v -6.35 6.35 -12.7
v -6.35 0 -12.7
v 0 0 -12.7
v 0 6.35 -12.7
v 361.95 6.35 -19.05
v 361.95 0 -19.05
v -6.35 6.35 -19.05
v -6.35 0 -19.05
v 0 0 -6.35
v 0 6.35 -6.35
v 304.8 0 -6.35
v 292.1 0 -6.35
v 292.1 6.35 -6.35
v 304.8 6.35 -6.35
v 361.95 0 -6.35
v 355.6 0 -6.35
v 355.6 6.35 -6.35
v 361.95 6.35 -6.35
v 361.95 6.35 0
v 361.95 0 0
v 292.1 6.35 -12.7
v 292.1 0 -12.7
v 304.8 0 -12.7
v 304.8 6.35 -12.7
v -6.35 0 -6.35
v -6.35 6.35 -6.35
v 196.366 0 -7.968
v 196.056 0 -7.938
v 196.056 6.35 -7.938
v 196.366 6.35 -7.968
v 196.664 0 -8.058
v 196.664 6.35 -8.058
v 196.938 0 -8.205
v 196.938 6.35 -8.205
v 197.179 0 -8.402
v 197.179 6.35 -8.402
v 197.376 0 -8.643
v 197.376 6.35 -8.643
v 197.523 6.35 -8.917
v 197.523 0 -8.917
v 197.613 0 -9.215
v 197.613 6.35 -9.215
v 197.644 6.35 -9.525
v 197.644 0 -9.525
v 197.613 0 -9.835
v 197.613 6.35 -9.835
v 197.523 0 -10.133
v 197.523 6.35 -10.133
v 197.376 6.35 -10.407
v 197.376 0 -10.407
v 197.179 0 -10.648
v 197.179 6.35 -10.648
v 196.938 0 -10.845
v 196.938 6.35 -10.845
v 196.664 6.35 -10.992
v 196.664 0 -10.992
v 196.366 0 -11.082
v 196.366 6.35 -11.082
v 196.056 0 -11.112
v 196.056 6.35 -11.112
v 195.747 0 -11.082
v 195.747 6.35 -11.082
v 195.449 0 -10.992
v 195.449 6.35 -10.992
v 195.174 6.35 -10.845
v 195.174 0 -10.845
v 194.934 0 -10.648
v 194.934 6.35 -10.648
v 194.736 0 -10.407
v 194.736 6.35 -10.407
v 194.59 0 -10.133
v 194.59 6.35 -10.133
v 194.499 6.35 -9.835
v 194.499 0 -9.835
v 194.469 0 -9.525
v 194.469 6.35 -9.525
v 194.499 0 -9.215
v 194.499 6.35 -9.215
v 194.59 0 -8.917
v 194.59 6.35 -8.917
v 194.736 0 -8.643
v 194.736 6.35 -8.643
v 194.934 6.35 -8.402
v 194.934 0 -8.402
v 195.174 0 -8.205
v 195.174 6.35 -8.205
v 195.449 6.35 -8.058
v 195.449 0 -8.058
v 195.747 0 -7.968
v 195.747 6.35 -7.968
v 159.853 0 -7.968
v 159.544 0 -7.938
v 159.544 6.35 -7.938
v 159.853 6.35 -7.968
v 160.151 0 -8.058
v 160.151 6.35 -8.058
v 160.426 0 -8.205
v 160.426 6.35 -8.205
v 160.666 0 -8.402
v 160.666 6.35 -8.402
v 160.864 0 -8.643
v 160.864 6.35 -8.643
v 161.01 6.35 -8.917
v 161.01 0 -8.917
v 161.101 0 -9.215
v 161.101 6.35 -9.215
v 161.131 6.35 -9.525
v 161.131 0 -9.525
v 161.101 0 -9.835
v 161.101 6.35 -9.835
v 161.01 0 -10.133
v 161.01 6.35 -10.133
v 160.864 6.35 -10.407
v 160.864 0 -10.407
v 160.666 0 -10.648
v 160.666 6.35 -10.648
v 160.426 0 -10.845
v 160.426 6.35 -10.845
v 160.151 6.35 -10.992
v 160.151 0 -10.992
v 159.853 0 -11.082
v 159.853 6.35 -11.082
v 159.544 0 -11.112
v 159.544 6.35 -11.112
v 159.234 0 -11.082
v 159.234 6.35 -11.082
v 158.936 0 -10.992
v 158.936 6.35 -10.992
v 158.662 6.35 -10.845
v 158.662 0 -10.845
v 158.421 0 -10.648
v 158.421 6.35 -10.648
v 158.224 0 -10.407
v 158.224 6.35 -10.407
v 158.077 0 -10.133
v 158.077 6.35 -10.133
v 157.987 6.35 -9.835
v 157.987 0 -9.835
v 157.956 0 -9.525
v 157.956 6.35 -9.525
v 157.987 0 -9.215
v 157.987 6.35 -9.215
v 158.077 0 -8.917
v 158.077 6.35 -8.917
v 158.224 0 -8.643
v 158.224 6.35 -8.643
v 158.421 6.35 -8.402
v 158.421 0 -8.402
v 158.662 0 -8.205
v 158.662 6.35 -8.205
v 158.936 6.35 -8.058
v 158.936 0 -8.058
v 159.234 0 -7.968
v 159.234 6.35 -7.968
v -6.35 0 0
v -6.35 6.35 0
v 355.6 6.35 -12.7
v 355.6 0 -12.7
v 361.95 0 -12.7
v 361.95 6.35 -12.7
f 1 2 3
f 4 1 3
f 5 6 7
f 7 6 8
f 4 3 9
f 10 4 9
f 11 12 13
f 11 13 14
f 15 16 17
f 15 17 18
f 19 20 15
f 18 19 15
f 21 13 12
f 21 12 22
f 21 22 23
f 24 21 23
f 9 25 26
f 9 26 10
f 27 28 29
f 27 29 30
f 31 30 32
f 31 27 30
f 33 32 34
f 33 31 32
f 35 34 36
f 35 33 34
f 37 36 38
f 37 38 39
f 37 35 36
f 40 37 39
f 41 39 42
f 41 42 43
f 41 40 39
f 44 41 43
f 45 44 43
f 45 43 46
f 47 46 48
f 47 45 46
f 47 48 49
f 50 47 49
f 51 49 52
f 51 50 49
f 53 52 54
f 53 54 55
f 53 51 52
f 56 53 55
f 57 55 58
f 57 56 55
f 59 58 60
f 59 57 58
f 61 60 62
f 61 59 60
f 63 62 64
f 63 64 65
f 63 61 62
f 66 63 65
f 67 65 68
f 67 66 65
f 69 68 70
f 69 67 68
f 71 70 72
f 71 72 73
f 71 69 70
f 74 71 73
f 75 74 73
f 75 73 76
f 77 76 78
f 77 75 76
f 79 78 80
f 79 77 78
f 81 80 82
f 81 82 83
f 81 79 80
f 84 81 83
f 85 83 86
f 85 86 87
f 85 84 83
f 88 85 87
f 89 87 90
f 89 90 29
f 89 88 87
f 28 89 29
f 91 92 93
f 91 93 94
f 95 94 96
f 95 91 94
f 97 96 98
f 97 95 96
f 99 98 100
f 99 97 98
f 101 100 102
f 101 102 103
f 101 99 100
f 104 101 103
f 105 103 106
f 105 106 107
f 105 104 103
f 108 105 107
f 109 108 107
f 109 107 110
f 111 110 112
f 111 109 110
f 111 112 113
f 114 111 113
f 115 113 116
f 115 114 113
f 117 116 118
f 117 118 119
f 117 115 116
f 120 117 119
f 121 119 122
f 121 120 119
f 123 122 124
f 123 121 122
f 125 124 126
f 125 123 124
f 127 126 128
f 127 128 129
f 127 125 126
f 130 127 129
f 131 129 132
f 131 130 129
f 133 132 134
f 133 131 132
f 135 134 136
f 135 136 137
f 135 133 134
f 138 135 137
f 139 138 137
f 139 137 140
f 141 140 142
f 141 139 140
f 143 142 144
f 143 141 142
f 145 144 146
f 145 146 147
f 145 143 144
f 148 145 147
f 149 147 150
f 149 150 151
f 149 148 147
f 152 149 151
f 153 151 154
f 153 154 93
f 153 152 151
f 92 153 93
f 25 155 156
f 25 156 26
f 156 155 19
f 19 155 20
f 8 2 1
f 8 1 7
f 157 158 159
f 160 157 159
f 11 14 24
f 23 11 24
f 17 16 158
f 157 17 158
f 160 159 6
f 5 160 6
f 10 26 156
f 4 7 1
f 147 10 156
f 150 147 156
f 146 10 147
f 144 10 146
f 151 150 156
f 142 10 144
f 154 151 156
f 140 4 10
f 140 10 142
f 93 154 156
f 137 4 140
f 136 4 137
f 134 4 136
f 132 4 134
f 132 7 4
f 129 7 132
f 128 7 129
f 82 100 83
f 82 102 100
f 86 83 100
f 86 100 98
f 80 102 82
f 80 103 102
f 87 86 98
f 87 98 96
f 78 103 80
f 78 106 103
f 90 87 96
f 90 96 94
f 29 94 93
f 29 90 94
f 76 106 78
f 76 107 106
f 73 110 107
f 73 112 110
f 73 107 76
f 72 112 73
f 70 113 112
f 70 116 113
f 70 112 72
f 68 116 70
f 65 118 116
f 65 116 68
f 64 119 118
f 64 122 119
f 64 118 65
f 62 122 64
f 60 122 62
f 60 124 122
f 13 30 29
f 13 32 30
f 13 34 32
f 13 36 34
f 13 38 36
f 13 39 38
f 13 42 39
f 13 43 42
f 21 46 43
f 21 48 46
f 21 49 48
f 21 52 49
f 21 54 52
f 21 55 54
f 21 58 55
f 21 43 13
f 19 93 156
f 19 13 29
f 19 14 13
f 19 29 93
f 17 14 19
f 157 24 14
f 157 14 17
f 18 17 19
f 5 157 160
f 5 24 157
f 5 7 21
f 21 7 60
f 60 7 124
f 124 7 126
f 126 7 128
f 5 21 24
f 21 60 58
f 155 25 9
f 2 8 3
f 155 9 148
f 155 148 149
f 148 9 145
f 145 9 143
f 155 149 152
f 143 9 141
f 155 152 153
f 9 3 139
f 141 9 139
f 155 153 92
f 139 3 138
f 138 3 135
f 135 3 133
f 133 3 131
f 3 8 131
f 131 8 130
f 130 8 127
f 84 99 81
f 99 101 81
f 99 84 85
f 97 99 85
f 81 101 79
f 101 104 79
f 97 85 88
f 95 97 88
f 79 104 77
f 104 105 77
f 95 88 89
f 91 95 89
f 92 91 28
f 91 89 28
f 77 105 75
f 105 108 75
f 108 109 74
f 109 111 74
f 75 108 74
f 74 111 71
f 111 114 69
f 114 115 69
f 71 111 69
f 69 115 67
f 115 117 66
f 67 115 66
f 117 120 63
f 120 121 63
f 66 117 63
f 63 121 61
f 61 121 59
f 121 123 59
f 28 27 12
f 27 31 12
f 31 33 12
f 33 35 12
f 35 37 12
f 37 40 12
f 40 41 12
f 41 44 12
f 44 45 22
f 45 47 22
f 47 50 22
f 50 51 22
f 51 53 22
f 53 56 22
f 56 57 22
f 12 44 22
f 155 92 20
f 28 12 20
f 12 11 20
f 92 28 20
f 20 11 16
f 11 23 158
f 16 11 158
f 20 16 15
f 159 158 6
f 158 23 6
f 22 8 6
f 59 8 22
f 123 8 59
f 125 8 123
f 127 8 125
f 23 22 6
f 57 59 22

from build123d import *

# Parameters (mm, degrees)
SKETCH1_R           = 1.5875
SKETCH1_W           = 12.7
SKETCH1_H           = 6.35
SKETCH1_W_2         = 6.35
BOSS_EXTRUDE1_DEPTH = 6.35


with BuildPart() as part:
    # Sketch1 → Boss-Extrude1 (new body)
    # profile 1 of 6: a face of its own
    with BuildSketch(Plane(origin=(0, 0, 0), x_dir=(1, 0, 0), z_dir=(0, 1, 0))):
        Polygon((355.6, 19.05), (177.8, 19.05), (177.8, 0), (355.6, 0), (355.6, 6.35), (355.6, 12.7), align=None)
        with Locations(Location((196.05625, 9.525, 0), (0, 0, 270))):
            Circle(SKETCH1_R, mode=Mode.SUBTRACT)
        with Locations((298.45, 9.525)):
            Rectangle(SKETCH1_W, SKETCH1_H, mode=Mode.SUBTRACT)
    # profile 2 of 6: a face of its own
    with BuildSketch(Plane(origin=(0, 0, 0), x_dir=(1, 0, 0), z_dir=(0, 1, 0))):
        Polygon((177.8, 0), (177.8, 19.05), (0, 19.05), (0, 12.7), (0, 6.35), (0, 0), align=None)
        with Locations(Location((159.54375, 9.525, 0), (0, 0, 270))):
            Circle(SKETCH1_R, mode=Mode.SUBTRACT)
    # profile 3 of 6: a face of its own
    with BuildSketch(Plane(origin=(0, 0, 0), x_dir=(1, 0, 0), z_dir=(0, 1, 0))):
        with Locations((-3.175, 15.875)):
            Rectangle(SKETCH1_W_2, SKETCH1_H)
    # profile 4 of 6: a face of its own
    with BuildSketch(Plane(origin=(0, 0, 0), x_dir=(1, 0, 0), z_dir=(0, 1, 0))):
        with Locations((358.775, 15.875)):
            Rectangle(SKETCH1_W_2, SKETCH1_H)
    # profile 5 of 6: a face of its own
    with BuildSketch(Plane(origin=(0, 0, 0), x_dir=(1, 0, 0), z_dir=(0, 1, 0))):
        with Locations((-3.175, 3.175)):
            Rectangle(SKETCH1_W_2, SKETCH1_H)
    # profile 6 of 6: a face of its own
    with BuildSketch(Plane(origin=(0, 0, 0), x_dir=(1, 0, 0), z_dir=(0, 1, 0))):
        with Locations((358.775, 3.175)):
            Rectangle(SKETCH1_W_2, SKETCH1_H)
    extrude(amount=BOSS_EXTRUDE1_DEPTH)


solid = part.part
